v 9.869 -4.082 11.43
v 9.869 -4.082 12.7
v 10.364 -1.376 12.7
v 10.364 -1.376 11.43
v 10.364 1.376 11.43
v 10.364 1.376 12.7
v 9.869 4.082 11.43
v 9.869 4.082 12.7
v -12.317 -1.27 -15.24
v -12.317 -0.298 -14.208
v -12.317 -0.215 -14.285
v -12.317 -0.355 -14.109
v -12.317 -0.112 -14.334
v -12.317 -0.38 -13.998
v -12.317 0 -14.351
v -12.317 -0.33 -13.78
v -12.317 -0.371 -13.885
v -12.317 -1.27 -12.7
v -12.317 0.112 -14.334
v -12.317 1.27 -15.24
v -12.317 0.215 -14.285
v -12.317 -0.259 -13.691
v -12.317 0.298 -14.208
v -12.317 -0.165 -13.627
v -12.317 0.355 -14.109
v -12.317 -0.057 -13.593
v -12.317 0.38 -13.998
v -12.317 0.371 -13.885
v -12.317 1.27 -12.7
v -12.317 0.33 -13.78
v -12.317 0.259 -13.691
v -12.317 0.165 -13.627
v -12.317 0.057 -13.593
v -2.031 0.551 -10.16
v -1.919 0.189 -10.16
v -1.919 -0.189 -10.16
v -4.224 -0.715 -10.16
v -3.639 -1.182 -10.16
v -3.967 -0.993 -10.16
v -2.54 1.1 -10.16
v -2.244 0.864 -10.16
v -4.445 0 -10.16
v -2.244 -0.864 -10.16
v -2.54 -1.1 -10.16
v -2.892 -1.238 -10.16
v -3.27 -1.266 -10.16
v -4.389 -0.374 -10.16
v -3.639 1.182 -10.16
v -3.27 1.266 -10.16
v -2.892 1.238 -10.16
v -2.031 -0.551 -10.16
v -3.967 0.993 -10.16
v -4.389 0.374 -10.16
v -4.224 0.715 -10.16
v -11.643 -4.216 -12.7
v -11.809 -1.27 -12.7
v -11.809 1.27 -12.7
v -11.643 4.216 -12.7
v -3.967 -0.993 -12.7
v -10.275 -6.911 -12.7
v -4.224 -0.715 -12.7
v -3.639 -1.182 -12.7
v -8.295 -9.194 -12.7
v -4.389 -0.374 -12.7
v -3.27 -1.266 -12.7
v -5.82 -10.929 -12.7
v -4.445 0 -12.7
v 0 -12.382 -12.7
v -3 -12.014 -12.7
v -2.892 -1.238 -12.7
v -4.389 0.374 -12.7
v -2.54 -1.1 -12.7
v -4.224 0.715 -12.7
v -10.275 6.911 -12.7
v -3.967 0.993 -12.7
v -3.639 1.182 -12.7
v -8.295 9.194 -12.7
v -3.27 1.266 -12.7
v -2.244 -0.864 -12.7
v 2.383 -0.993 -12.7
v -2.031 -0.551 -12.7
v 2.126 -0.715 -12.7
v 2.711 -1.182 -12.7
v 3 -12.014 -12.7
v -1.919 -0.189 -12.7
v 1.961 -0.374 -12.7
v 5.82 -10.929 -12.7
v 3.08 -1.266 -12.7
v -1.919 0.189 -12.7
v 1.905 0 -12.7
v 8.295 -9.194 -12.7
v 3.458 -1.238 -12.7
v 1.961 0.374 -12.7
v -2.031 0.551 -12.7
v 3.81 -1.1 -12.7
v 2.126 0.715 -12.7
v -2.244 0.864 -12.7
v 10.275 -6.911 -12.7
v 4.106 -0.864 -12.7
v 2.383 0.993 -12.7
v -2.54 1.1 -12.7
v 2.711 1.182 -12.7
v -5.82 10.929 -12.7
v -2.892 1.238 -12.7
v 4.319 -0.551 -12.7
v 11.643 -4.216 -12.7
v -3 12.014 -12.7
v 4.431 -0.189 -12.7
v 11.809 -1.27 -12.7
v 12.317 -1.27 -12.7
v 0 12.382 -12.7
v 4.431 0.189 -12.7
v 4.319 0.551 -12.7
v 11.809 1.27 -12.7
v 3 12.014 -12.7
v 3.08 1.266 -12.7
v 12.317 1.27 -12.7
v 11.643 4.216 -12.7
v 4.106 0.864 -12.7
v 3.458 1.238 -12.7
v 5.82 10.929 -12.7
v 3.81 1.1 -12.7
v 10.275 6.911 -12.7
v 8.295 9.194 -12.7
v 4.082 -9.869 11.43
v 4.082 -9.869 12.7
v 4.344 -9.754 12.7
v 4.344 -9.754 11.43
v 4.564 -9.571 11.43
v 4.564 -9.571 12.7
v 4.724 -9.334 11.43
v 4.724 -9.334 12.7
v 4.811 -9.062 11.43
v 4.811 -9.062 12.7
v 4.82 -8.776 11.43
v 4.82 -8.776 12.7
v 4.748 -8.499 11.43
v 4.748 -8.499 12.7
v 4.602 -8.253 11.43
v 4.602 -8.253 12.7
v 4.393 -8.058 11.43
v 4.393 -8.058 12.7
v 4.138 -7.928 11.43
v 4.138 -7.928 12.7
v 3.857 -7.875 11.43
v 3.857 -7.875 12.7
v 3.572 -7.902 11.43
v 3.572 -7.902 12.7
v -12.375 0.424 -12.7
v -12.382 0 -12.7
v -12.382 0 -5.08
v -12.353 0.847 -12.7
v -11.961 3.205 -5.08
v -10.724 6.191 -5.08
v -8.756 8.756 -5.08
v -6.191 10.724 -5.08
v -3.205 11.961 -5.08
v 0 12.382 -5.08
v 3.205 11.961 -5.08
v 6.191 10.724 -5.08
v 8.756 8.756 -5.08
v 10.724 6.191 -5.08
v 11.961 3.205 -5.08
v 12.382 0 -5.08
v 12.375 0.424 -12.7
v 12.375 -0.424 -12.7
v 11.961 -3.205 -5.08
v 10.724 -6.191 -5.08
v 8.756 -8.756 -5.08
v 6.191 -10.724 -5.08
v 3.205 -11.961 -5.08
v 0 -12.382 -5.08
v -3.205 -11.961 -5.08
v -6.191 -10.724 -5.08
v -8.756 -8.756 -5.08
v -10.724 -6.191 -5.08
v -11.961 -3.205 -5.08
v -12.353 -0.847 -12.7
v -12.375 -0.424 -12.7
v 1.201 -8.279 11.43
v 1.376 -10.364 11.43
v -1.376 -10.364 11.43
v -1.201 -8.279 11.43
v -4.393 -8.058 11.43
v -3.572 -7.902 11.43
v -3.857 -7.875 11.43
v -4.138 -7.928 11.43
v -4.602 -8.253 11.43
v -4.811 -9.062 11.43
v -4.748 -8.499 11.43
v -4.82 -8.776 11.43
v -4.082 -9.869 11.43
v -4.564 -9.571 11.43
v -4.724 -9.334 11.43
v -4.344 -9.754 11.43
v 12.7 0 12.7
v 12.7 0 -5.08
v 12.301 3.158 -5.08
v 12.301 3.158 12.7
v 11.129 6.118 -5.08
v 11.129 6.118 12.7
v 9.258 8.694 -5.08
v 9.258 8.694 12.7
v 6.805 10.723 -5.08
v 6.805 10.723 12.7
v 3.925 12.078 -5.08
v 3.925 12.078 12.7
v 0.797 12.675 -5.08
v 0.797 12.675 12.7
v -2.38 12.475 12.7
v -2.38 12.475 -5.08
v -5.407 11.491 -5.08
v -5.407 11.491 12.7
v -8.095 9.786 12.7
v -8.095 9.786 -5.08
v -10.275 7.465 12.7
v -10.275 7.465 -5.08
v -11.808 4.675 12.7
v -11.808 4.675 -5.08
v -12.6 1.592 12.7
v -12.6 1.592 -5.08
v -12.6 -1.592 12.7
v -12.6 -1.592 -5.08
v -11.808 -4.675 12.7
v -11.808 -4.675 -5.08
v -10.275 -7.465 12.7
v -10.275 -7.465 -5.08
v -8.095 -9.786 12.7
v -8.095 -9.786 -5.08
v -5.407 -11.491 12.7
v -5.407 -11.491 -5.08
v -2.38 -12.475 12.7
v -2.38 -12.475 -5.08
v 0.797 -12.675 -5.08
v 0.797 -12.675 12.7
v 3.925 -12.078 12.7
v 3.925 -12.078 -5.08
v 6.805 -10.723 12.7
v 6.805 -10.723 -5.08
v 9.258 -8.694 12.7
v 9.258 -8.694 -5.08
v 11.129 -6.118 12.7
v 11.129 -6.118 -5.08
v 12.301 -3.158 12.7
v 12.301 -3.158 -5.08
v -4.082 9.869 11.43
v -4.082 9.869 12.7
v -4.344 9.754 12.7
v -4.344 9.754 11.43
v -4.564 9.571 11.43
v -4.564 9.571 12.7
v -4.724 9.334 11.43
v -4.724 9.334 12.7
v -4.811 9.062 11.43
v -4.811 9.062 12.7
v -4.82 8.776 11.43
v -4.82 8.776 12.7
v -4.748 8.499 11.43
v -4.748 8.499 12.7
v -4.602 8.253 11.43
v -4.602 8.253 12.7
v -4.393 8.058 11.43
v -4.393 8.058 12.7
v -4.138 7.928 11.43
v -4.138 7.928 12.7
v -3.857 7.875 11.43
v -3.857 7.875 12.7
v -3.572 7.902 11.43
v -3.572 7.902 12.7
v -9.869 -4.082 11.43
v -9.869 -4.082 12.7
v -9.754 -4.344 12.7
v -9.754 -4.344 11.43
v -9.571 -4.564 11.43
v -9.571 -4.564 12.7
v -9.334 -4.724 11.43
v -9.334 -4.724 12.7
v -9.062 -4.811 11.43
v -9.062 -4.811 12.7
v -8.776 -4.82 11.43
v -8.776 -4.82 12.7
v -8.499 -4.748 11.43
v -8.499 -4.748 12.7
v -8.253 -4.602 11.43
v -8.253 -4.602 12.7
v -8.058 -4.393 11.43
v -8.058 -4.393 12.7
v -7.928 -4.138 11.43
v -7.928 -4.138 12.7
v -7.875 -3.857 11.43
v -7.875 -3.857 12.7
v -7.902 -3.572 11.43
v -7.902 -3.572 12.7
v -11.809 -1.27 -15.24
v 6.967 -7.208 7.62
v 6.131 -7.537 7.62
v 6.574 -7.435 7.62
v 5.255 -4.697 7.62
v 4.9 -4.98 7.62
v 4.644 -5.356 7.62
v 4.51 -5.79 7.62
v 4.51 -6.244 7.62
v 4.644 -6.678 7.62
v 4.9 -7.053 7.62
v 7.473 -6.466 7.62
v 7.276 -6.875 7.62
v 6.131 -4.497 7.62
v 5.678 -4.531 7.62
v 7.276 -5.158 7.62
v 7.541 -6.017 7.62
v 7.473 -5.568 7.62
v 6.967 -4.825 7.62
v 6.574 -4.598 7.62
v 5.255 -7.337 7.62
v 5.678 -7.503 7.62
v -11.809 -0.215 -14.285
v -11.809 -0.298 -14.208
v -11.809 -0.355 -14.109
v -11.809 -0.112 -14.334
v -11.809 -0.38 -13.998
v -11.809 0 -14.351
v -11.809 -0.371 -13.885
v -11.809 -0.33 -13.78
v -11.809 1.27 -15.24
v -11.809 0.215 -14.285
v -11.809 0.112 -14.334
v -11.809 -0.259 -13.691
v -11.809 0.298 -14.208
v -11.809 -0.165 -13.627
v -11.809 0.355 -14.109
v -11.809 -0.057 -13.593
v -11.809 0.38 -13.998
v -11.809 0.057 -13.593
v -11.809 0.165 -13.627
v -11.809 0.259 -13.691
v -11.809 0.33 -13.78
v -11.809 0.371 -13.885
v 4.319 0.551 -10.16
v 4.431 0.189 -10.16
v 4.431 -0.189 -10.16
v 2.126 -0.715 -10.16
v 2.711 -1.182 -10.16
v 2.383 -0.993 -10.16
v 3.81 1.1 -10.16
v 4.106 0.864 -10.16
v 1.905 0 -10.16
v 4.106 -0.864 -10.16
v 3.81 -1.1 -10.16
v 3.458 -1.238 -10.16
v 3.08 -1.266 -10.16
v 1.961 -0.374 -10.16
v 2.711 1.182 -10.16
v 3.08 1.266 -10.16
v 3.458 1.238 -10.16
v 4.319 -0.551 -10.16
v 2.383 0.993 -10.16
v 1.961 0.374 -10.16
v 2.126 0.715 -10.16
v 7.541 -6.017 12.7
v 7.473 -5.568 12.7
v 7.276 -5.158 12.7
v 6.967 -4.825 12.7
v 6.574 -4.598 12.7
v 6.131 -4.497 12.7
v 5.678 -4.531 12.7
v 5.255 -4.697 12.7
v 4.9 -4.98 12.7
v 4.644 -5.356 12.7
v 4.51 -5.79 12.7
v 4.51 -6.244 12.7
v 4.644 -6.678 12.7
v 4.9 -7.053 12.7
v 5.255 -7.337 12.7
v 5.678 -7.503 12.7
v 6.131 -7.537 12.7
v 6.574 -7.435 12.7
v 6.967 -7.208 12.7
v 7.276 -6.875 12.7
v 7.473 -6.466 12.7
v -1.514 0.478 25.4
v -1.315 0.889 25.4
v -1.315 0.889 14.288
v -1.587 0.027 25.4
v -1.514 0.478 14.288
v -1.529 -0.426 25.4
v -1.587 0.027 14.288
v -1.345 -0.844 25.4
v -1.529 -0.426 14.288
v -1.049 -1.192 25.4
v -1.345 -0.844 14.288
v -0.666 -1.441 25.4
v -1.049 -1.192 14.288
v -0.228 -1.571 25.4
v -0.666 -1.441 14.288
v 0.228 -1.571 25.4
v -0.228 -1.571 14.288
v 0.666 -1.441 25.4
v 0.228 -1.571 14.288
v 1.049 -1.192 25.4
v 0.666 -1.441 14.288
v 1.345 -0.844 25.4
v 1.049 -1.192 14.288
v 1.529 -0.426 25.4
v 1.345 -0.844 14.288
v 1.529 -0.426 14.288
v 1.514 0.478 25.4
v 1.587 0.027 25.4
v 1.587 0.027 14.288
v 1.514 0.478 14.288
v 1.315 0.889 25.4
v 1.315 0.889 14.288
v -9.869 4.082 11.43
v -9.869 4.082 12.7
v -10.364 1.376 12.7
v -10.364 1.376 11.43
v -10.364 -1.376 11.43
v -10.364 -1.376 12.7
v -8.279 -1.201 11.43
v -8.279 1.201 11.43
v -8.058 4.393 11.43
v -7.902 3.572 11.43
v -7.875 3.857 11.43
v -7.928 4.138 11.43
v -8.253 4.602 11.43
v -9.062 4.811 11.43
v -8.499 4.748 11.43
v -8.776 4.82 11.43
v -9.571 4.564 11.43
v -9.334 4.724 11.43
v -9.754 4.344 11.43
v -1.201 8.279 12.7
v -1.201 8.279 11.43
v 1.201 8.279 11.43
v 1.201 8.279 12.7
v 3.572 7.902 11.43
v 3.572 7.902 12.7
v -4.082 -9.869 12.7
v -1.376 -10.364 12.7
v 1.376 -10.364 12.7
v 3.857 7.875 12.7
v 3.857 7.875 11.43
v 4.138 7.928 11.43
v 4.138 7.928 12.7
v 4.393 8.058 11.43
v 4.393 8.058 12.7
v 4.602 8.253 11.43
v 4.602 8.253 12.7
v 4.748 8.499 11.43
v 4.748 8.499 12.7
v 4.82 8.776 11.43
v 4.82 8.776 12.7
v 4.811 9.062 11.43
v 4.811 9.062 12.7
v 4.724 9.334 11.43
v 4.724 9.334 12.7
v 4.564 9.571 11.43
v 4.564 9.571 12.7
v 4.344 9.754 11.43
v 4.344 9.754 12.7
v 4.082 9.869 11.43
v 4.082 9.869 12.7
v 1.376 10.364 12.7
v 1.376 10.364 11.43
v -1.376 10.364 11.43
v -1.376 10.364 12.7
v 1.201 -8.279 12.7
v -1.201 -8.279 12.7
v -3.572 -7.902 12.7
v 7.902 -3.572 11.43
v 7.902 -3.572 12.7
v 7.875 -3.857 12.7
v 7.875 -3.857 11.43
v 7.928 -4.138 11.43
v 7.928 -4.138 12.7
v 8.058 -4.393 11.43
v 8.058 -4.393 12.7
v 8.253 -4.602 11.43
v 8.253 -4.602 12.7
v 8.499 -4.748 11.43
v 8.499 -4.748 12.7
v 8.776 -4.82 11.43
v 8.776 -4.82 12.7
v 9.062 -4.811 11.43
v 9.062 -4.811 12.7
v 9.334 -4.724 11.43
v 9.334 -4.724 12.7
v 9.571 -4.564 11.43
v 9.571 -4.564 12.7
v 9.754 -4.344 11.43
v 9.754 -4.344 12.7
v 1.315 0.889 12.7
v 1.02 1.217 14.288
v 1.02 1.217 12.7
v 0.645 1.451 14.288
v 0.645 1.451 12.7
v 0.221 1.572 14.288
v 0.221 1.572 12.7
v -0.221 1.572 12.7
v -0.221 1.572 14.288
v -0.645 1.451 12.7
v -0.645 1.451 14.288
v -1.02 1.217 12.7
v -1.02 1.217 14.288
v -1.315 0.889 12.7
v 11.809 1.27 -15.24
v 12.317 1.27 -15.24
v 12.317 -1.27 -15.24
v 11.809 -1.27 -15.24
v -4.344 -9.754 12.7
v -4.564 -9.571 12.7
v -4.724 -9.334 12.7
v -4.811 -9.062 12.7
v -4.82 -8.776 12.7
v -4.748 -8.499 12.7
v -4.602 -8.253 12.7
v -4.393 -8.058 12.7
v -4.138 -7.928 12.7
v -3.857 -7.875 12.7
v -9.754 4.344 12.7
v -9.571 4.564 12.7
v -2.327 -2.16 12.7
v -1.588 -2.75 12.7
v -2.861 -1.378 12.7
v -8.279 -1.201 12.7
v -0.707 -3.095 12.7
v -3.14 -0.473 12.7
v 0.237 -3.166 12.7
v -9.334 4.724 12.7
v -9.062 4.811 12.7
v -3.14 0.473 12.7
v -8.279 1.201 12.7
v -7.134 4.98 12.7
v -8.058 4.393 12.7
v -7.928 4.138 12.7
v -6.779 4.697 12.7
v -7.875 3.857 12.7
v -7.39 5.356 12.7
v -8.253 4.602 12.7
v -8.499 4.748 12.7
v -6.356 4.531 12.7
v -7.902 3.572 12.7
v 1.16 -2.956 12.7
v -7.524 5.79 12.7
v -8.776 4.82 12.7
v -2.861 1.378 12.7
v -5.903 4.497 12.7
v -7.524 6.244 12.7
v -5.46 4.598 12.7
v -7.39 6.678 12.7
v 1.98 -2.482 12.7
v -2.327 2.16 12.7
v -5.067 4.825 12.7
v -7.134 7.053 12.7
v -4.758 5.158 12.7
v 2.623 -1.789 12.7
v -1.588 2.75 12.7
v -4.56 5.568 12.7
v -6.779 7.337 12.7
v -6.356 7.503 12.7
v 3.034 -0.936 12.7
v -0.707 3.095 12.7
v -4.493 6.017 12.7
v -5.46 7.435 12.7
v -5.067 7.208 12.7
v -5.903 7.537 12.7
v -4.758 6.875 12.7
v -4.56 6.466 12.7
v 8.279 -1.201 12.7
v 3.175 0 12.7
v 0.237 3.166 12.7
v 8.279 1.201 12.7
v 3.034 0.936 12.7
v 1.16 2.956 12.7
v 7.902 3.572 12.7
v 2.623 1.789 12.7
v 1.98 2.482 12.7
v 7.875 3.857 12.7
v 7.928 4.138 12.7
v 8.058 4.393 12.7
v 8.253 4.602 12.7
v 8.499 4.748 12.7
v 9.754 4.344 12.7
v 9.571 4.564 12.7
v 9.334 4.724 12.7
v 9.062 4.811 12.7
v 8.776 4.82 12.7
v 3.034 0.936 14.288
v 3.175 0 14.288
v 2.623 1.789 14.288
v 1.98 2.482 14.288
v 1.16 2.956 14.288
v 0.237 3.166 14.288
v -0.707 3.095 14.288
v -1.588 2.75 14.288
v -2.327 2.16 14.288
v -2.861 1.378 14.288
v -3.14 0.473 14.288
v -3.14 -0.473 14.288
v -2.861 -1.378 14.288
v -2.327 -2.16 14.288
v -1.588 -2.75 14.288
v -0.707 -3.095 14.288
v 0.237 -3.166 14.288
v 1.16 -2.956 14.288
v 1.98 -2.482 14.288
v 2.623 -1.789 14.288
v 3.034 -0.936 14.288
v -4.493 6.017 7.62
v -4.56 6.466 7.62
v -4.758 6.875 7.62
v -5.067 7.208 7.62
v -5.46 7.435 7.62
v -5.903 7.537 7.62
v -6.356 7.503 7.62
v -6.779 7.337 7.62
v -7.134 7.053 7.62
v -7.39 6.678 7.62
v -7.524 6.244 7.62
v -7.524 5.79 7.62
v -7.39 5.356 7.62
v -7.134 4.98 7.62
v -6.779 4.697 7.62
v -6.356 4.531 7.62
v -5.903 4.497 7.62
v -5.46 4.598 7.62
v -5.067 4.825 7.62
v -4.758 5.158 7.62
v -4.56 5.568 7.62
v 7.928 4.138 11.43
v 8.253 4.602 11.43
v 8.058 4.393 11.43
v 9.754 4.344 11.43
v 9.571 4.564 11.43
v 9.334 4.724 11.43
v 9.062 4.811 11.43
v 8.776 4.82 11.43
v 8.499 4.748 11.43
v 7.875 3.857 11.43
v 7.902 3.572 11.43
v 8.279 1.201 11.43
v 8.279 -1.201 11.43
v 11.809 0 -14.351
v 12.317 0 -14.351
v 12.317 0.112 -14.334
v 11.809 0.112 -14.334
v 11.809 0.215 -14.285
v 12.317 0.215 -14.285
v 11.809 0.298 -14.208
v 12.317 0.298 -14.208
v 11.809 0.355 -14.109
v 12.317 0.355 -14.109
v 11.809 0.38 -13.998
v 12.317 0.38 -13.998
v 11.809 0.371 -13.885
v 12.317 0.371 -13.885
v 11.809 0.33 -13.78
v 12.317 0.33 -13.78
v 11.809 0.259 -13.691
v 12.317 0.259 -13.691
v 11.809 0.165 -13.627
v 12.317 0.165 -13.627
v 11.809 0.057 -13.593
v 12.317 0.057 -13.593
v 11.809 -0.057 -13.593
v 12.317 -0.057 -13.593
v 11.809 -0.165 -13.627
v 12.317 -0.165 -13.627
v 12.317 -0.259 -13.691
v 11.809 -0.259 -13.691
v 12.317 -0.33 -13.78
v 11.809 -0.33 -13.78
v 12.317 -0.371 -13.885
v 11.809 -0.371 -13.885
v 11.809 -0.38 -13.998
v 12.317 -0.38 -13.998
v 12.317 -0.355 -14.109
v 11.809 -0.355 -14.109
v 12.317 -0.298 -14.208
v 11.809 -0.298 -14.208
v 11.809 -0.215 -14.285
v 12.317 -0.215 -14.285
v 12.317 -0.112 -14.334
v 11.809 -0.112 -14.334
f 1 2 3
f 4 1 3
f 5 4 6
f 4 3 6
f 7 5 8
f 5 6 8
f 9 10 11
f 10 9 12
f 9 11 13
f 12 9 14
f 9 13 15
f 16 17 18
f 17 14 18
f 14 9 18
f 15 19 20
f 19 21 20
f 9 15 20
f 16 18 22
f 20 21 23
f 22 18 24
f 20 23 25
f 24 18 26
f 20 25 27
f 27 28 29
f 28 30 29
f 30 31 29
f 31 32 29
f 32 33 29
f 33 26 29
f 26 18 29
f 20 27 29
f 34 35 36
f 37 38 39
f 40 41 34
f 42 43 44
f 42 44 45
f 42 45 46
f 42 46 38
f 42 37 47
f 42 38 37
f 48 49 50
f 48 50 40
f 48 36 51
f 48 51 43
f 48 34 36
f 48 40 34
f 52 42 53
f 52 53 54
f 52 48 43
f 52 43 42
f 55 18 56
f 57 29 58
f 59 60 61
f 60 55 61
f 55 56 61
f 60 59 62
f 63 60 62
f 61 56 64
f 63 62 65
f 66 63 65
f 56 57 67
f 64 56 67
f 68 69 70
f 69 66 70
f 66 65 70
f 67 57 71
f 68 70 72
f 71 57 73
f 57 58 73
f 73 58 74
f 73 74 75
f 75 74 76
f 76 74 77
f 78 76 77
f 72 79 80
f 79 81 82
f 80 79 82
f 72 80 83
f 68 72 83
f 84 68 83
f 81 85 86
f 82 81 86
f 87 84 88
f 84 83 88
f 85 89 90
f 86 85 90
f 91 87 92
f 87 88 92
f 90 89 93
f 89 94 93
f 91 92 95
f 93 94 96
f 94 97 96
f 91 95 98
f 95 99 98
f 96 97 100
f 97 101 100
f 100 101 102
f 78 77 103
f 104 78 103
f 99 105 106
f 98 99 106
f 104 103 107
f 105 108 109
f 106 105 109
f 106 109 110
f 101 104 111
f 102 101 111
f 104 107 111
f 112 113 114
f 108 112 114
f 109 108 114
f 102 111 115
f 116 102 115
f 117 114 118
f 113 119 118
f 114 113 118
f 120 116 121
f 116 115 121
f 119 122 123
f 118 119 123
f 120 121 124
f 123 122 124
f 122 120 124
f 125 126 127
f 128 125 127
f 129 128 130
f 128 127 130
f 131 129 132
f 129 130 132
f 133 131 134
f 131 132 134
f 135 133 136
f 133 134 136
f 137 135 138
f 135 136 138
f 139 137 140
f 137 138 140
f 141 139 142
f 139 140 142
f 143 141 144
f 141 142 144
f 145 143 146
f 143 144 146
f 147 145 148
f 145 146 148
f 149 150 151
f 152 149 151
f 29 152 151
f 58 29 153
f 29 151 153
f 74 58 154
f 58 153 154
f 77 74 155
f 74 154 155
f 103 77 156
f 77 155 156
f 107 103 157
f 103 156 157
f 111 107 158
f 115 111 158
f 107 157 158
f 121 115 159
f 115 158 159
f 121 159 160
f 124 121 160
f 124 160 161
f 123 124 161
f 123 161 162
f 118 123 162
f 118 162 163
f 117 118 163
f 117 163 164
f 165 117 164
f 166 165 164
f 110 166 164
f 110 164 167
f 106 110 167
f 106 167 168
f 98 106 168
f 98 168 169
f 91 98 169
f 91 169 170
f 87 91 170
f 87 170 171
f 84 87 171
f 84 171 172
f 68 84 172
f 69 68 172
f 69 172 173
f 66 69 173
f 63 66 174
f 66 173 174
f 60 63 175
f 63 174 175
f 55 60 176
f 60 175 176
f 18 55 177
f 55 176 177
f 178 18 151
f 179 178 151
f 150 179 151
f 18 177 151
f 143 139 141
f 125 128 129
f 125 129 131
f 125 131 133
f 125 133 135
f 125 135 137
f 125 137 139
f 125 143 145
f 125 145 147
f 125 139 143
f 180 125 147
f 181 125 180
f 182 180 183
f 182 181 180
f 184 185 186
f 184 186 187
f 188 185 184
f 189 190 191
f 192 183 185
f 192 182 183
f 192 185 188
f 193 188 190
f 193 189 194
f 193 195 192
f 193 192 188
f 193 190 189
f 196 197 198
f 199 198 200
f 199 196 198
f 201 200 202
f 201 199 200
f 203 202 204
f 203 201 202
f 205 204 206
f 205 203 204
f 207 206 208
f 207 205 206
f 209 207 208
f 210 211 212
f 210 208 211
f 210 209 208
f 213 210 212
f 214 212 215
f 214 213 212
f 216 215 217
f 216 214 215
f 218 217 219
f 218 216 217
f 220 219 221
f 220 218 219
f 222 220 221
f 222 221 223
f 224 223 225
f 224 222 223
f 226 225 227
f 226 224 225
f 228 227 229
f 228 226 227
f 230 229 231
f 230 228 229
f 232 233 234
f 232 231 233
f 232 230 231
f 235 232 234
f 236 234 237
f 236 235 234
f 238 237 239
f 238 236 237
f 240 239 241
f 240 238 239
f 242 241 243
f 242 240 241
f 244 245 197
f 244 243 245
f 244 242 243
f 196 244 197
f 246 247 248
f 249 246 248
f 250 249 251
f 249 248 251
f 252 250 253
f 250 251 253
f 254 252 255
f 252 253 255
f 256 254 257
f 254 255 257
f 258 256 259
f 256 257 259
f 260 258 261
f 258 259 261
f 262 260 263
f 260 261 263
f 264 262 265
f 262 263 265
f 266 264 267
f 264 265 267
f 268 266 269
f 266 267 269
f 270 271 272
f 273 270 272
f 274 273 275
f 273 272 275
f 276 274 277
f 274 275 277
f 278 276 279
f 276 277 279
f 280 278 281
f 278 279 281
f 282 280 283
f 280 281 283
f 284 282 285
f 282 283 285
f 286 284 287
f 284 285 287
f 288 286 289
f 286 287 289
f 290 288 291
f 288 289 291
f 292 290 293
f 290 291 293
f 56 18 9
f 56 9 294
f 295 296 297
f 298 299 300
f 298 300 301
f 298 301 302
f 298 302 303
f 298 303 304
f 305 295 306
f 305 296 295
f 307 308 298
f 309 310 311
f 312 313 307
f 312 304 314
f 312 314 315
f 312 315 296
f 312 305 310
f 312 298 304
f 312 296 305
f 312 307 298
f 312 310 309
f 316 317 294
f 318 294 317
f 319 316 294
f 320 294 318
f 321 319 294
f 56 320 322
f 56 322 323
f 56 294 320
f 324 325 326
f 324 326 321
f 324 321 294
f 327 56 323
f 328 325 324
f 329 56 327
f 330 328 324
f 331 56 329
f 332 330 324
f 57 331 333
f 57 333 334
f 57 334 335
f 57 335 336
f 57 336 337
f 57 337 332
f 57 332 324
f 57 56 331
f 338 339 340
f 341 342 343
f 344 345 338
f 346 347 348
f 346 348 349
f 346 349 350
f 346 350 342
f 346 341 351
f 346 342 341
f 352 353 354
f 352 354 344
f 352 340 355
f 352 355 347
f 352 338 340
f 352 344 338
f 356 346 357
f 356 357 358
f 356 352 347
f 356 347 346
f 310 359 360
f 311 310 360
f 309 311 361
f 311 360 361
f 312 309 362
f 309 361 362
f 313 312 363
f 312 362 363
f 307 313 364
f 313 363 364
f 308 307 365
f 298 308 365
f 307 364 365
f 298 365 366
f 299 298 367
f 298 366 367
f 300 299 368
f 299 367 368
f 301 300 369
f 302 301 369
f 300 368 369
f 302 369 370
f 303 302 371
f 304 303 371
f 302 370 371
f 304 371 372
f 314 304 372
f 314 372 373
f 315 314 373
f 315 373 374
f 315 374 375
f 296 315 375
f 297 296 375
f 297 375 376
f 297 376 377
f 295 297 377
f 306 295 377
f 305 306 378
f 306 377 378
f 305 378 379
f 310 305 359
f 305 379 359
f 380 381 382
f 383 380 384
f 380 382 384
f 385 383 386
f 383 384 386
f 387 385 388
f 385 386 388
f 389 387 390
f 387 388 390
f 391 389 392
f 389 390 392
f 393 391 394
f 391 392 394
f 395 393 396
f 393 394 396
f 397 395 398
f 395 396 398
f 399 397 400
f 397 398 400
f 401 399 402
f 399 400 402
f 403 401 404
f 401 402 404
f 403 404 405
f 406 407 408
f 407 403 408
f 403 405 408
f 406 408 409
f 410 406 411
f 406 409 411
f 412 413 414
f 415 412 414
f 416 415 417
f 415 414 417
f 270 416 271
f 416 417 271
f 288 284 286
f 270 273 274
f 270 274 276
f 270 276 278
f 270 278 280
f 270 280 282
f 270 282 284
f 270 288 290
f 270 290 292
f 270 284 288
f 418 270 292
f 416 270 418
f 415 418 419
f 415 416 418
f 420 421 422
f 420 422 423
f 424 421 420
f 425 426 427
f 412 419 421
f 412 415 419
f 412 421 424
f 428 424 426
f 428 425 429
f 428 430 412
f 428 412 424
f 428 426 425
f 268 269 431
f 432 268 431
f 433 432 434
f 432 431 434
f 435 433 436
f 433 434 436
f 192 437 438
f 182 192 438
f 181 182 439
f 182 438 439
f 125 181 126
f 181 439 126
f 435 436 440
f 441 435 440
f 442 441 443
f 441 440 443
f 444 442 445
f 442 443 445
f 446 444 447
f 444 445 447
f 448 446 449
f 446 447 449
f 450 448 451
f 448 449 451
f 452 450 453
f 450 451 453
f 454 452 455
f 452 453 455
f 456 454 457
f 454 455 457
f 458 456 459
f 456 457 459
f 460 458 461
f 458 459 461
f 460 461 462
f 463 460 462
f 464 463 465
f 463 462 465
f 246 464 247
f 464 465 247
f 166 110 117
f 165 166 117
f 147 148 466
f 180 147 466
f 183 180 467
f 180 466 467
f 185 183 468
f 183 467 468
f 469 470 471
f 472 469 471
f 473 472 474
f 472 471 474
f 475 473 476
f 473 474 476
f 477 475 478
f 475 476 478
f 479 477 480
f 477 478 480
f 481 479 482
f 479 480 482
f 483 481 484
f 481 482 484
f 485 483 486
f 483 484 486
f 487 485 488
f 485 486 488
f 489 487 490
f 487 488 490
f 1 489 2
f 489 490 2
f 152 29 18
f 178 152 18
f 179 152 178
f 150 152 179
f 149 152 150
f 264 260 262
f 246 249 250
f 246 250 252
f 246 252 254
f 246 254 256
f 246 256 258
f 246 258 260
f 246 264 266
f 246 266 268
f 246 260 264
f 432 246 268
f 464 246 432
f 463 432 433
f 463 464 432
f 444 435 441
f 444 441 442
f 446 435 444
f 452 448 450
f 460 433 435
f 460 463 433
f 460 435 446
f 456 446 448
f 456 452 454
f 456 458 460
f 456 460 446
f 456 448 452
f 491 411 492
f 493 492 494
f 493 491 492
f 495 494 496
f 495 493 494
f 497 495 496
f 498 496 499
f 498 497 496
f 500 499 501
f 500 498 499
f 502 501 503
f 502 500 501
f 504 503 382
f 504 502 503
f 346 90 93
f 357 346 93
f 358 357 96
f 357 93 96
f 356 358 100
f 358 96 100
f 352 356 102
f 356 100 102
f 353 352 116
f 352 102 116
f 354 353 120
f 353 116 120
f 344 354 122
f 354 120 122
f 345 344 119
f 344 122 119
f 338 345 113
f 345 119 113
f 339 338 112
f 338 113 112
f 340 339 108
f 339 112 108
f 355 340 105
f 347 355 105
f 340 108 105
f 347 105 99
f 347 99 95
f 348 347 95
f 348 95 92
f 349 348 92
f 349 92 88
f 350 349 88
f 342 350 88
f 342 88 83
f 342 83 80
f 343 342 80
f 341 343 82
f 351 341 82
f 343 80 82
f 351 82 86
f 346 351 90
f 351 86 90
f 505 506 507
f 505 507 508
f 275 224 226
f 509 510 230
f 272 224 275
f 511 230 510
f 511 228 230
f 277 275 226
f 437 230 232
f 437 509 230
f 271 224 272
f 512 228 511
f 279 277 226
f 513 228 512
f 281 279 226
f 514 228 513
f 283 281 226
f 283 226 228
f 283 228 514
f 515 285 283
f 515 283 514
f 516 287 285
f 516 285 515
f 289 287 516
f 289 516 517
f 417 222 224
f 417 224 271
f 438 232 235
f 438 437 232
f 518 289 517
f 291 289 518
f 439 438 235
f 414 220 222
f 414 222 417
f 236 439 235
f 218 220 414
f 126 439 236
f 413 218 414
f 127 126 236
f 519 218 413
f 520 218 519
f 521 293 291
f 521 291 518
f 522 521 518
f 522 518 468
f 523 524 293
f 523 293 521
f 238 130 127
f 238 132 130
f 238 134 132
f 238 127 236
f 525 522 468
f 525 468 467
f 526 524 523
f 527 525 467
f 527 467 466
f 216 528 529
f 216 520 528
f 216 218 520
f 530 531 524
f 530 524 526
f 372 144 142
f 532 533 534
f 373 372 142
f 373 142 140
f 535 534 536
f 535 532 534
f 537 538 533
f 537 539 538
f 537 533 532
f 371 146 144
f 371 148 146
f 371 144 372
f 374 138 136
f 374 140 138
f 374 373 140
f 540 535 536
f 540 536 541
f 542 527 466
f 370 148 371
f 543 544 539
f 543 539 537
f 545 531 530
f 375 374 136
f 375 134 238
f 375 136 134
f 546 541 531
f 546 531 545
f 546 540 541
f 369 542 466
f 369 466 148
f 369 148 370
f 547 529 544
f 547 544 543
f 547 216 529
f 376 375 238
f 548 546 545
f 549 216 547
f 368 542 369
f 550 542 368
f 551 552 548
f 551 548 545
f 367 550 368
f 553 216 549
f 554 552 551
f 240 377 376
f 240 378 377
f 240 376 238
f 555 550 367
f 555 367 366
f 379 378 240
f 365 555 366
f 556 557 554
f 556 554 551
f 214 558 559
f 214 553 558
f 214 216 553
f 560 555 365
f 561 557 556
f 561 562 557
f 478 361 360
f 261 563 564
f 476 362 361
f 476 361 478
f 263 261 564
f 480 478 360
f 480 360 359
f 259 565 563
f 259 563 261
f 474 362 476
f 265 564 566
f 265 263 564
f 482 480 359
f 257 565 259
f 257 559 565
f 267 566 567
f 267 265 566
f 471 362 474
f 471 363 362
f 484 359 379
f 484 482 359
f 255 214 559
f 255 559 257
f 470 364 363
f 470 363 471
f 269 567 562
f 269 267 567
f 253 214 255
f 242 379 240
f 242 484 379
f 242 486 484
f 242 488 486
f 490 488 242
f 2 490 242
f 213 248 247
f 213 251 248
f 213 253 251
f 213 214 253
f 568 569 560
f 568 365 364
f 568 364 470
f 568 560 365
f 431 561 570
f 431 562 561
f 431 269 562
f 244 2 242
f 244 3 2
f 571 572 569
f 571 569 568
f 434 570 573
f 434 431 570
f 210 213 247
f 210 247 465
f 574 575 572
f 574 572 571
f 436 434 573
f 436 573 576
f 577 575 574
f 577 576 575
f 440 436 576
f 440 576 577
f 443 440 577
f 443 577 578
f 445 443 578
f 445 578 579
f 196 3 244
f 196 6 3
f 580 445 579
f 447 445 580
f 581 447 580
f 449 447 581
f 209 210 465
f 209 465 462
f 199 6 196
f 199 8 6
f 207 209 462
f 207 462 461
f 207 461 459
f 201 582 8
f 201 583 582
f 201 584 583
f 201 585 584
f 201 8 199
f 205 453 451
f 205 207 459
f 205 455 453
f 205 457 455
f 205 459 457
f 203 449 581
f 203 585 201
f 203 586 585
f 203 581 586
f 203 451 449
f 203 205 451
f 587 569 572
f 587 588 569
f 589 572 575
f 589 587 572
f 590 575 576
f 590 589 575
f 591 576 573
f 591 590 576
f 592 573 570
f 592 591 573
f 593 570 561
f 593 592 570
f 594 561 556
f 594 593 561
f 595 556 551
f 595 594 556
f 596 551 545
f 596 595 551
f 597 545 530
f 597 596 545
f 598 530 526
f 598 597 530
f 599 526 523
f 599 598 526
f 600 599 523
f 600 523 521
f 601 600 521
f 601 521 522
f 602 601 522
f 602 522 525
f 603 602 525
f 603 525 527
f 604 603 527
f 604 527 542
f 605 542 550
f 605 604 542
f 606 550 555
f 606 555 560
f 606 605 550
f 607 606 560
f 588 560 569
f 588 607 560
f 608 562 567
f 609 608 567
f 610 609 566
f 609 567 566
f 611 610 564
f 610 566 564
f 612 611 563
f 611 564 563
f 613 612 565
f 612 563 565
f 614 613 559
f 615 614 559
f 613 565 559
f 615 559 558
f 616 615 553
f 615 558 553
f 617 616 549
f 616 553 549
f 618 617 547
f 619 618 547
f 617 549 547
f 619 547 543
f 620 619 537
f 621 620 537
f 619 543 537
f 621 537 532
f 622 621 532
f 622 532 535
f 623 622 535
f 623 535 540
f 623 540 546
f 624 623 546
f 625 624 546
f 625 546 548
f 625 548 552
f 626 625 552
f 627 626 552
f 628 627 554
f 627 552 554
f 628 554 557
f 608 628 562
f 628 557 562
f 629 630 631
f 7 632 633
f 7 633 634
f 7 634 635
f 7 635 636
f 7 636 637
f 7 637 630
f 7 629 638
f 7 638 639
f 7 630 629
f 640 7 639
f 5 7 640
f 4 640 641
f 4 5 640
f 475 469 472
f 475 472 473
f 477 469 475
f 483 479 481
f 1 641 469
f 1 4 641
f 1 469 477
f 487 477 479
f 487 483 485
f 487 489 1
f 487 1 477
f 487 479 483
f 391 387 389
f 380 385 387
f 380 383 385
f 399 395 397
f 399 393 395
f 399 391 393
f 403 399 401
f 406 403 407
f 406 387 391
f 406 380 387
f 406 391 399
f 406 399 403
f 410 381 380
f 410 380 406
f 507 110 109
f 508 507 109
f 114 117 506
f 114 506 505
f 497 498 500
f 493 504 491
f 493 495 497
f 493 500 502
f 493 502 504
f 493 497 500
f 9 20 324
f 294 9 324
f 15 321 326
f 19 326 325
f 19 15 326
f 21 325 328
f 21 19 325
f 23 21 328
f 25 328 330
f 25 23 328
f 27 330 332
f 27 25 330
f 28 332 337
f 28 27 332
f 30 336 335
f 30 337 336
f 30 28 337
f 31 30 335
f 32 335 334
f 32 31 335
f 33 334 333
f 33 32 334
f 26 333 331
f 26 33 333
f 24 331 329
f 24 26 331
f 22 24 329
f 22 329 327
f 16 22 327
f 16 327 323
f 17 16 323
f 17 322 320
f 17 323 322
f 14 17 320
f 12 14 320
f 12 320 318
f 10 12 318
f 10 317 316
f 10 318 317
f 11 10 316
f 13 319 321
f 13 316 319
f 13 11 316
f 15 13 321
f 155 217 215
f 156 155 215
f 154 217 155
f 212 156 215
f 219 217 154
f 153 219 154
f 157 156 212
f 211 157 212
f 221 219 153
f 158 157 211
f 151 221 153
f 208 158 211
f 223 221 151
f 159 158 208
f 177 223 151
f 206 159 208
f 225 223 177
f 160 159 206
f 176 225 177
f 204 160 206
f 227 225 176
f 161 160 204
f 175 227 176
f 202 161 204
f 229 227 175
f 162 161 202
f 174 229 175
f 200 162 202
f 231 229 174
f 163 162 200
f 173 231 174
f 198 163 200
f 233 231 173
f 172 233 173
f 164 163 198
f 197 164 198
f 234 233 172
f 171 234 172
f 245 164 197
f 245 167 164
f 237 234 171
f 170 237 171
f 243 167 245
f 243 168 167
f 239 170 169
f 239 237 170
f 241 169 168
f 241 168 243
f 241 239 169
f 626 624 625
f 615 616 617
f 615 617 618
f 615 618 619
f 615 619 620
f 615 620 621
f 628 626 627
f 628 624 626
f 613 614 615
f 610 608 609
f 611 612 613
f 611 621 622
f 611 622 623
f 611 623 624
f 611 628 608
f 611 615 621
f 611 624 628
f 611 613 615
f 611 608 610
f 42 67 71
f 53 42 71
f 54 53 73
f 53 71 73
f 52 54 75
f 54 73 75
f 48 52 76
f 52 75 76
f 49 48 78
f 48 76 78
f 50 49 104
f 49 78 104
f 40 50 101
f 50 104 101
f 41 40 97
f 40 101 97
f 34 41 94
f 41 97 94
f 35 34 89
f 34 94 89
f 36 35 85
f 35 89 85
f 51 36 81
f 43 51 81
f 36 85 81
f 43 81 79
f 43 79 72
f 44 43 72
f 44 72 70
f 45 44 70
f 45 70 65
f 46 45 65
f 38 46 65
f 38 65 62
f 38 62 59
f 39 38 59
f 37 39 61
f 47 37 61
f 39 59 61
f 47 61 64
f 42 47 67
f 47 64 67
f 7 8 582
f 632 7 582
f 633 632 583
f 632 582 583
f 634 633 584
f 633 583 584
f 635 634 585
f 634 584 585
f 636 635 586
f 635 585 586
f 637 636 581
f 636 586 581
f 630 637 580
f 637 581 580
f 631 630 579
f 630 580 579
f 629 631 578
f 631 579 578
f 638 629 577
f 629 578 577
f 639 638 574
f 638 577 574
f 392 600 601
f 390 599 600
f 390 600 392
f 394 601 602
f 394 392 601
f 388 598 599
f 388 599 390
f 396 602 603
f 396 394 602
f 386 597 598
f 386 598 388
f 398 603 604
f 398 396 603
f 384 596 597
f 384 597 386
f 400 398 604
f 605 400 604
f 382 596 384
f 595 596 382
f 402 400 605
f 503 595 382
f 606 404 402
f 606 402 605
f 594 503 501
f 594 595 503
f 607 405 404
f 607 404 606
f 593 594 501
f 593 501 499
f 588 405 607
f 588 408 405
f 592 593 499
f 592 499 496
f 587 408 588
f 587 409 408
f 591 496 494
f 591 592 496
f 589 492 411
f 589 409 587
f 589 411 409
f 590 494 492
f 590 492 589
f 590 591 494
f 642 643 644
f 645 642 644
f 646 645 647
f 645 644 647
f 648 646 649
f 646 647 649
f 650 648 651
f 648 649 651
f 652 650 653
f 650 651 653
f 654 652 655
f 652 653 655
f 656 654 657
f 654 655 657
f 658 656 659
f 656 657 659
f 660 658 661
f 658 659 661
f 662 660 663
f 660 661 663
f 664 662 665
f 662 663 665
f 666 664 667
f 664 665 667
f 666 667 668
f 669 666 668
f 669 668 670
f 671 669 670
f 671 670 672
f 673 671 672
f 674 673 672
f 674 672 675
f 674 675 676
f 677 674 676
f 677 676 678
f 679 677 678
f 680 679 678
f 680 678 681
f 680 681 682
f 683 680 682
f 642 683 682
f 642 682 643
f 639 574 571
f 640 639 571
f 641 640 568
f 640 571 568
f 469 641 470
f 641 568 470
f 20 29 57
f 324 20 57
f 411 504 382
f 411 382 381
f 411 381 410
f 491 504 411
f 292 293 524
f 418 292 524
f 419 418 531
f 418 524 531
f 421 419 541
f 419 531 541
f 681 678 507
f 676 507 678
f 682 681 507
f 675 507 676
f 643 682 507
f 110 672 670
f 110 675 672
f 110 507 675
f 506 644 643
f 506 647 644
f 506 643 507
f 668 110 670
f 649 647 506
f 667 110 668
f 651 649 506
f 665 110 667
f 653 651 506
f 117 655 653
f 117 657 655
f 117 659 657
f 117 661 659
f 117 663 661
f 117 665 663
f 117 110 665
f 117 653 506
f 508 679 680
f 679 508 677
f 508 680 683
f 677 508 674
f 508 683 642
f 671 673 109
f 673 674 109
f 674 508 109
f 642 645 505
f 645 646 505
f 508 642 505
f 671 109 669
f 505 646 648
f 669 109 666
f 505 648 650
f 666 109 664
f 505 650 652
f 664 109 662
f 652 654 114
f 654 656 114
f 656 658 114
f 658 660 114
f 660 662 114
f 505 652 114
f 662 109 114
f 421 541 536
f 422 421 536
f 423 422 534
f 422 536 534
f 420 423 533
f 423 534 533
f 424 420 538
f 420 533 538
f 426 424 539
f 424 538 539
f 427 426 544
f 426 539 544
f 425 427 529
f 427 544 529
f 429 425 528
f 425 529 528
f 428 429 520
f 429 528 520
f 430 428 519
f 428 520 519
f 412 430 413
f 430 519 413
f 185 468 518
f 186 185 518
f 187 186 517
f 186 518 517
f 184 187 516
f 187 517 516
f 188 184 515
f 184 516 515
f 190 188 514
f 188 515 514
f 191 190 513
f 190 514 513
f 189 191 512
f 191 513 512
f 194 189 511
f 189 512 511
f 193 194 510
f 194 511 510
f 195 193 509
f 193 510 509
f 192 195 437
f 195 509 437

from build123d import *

# Parameters (mm, degrees)
SKETCH2_R           = 12.7
BOSS_EXTRUDE1_DEPTH = 12.7
SKETCH3_R           = 3.175
SKETCH3_R_2         = 1.5875
BOSS_EXTRUDE2_DEPTH = 1.5875
SKETCH4_R           = 1.5875
BOSS_EXTRUDE3_DEPTH = 12.7
CUT_EXTRUDE1_START  = -12.7
CUT_EXTRUDE1_DEPTH  = 12.7
CUT_EXTRUDE2_DEPTH  = 1.27
CIRPATTERN1_COUNT   = 4
SKETCH7_R           = 1.524
CUT_EXTRUDE3_DEPTH  = 5.08
CUT_EXTRUDE4_START  = -7.62
SKETCH8_R           = 12.7
SKETCH8_R_2         = 12.3825
CUT_EXTRUDE4_DEPTH  = 7.62
SKETCH9_R           = 1.27
CUT_EXTRUDE5_DEPTH  = 2.54
SKETCH11_W          = 0.508
SKETCH11_H          = 2.54
BOSS_EXTRUDE4_DEPTH = 2.54
SKETCH12_R          = 0.381
CUT_EXTRUDE6_DEPTH  = 2.54


with BuildPart() as part:
    # Sketch2 → Boss-Extrude1 (new, symmetric)
    with BuildSketch(Plane.XY):
        Circle(SKETCH2_R)
    extrude(amount=BOSS_EXTRUDE1_DEPTH, both=True)

    # Sketch3 → Boss-Extrude2 (add, symmetric)
    with BuildSketch(Plane.XY.offset(12.7)):
        Circle(SKETCH3_R)
        Circle(SKETCH3_R_2, mode=Mode.SUBTRACT)
    extrude(amount=BOSS_EXTRUDE2_DEPTH, both=True)

    # Sketch4 → Boss-Extrude3 (add)
    with BuildSketch(Plane.XY.offset(12.7)):
        Circle(SKETCH4_R)
    extrude(amount=BOSS_EXTRUDE3_DEPTH)

    # Sketch5 → Cut-Extrude1 (cut)
    with BuildSketch(Plane.XY.offset(25.4).offset(CUT_EXTRUDE1_START)):
        with BuildLine():
            Line((-1.315232014, 0.889), (1.315232014, 0.889))
            ThreePointArc((1.315232014, 0.889), (0, 1.5875), (-1.315232014, 0.889))
        make_face()
    extrude(amount=CUT_EXTRUDE1_DEPTH, mode=Mode.SUBTRACT)

    # Sketch6 → Cut-Extrude2 (cut)
    with BuildSketch(Plane.XY.offset(12.7)):
        with BuildLine():
            ThreePointArc((-4.082142857, 9.868873978), (-4.793434391, 8.634827903), (-3.571875, 7.902299395))
            ThreePointArc((-3.571875, 7.902299395), (0, 8.326790326), (3.571875, 7.902299395))
            ThreePointArc((3.571875, 7.902299395), (4.793434391, 8.634827903), (4.082142857, 9.868873978))
            ThreePointArc((4.082142857, 9.868873978), (0, 10.425764304), (-4.082142857, 9.868873978))
        make_face()
    cut_extrude2 = extrude(amount=-CUT_EXTRUDE2_DEPTH, mode=Mode.SUBTRACT)

    # CirPattern1: Cut-Extrude2 ×4 about axis
    cirpattern1_axis = Axis((0, 0, 0), (0, 0, 1))
    for i in range(1, CIRPATTERN1_COUNT):
        add(cut_extrude2.rotate(cirpattern1_axis, i * 360 / CIRPATTERN1_COUNT), mode=Mode.SUBTRACT)

    # Sketch7 → Cut-Extrude3 (cut)
    with BuildSketch(Plane.XY.offset(12.7)):
        with Locations((-6.016771601, 6.016771601)):
            Circle(SKETCH7_R)
        with Locations((6.016771601, -6.016771601)):
            Circle(SKETCH7_R)
    extrude(amount=-CUT_EXTRUDE3_DEPTH, mode=Mode.SUBTRACT)

    # Sketch8 → Cut-Extrude4 (cut)
    with BuildSketch(Plane(origin=(0, 0, -12.7), x_dir=(-1, 0, 0), z_dir=(0, 0, -1)).offset(CUT_EXTRUDE4_START)):
        with Locations(Location((0, 0, 0), (0, 0, 180))):
            Circle(SKETCH8_R)
        Circle(SKETCH8_R_2, mode=Mode.SUBTRACT)
    extrude(amount=CUT_EXTRUDE4_DEPTH, mode=Mode.SUBTRACT)

    # Sketch9 → Cut-Extrude5 (cut)
    with BuildSketch(Plane(origin=(0, 0, -12.7), x_dir=(-1, 0, 0), z_dir=(0, 0, -1))):
        with Locations((-3.175, 0)):
            Circle(SKETCH9_R)
        with Locations((3.175, 0)):
            Circle(SKETCH9_R)
    extrude(amount=-CUT_EXTRUDE5_DEPTH, mode=Mode.SUBTRACT)

    # Sketch11 → Boss-Extrude4 (add)
    with BuildSketch(Plane(origin=(0, 0, -12.7), x_dir=(-1, 0, 0), z_dir=(0, 0, -1))):
        with Locations((-12.063199611, 0)):
            Rectangle(SKETCH11_W, SKETCH11_H)
    boss_extrude4 = extrude(amount=BOSS_EXTRUDE4_DEPTH)

    # Sketch12 → Cut-Extrude6 (cut)
    with BuildSketch(Plane(origin=(12.317199611, 0, 0), x_dir=(0, 0, -1), z_dir=(1, 0, 0))):
        with Locations((13.97, 0)):
            Circle(SKETCH12_R)
    cut_extrude6 = extrude(amount=-CUT_EXTRUDE6_DEPTH, mode=Mode.SUBTRACT)

    # Mirror1: Boss-Extrude4, Cut-Extrude6 across plane
    add(boss_extrude4.mirror(Plane(origin=(0, 0, 0), x_dir=(0, 0, 1), z_dir=(1, 0, 0))))
    add(cut_extrude6.mirror(Plane(origin=(0, 0, 0), x_dir=(0, 0, 1), z_dir=(1, 0, 0))), mode=Mode.SUBTRACT)


solid = part.part
